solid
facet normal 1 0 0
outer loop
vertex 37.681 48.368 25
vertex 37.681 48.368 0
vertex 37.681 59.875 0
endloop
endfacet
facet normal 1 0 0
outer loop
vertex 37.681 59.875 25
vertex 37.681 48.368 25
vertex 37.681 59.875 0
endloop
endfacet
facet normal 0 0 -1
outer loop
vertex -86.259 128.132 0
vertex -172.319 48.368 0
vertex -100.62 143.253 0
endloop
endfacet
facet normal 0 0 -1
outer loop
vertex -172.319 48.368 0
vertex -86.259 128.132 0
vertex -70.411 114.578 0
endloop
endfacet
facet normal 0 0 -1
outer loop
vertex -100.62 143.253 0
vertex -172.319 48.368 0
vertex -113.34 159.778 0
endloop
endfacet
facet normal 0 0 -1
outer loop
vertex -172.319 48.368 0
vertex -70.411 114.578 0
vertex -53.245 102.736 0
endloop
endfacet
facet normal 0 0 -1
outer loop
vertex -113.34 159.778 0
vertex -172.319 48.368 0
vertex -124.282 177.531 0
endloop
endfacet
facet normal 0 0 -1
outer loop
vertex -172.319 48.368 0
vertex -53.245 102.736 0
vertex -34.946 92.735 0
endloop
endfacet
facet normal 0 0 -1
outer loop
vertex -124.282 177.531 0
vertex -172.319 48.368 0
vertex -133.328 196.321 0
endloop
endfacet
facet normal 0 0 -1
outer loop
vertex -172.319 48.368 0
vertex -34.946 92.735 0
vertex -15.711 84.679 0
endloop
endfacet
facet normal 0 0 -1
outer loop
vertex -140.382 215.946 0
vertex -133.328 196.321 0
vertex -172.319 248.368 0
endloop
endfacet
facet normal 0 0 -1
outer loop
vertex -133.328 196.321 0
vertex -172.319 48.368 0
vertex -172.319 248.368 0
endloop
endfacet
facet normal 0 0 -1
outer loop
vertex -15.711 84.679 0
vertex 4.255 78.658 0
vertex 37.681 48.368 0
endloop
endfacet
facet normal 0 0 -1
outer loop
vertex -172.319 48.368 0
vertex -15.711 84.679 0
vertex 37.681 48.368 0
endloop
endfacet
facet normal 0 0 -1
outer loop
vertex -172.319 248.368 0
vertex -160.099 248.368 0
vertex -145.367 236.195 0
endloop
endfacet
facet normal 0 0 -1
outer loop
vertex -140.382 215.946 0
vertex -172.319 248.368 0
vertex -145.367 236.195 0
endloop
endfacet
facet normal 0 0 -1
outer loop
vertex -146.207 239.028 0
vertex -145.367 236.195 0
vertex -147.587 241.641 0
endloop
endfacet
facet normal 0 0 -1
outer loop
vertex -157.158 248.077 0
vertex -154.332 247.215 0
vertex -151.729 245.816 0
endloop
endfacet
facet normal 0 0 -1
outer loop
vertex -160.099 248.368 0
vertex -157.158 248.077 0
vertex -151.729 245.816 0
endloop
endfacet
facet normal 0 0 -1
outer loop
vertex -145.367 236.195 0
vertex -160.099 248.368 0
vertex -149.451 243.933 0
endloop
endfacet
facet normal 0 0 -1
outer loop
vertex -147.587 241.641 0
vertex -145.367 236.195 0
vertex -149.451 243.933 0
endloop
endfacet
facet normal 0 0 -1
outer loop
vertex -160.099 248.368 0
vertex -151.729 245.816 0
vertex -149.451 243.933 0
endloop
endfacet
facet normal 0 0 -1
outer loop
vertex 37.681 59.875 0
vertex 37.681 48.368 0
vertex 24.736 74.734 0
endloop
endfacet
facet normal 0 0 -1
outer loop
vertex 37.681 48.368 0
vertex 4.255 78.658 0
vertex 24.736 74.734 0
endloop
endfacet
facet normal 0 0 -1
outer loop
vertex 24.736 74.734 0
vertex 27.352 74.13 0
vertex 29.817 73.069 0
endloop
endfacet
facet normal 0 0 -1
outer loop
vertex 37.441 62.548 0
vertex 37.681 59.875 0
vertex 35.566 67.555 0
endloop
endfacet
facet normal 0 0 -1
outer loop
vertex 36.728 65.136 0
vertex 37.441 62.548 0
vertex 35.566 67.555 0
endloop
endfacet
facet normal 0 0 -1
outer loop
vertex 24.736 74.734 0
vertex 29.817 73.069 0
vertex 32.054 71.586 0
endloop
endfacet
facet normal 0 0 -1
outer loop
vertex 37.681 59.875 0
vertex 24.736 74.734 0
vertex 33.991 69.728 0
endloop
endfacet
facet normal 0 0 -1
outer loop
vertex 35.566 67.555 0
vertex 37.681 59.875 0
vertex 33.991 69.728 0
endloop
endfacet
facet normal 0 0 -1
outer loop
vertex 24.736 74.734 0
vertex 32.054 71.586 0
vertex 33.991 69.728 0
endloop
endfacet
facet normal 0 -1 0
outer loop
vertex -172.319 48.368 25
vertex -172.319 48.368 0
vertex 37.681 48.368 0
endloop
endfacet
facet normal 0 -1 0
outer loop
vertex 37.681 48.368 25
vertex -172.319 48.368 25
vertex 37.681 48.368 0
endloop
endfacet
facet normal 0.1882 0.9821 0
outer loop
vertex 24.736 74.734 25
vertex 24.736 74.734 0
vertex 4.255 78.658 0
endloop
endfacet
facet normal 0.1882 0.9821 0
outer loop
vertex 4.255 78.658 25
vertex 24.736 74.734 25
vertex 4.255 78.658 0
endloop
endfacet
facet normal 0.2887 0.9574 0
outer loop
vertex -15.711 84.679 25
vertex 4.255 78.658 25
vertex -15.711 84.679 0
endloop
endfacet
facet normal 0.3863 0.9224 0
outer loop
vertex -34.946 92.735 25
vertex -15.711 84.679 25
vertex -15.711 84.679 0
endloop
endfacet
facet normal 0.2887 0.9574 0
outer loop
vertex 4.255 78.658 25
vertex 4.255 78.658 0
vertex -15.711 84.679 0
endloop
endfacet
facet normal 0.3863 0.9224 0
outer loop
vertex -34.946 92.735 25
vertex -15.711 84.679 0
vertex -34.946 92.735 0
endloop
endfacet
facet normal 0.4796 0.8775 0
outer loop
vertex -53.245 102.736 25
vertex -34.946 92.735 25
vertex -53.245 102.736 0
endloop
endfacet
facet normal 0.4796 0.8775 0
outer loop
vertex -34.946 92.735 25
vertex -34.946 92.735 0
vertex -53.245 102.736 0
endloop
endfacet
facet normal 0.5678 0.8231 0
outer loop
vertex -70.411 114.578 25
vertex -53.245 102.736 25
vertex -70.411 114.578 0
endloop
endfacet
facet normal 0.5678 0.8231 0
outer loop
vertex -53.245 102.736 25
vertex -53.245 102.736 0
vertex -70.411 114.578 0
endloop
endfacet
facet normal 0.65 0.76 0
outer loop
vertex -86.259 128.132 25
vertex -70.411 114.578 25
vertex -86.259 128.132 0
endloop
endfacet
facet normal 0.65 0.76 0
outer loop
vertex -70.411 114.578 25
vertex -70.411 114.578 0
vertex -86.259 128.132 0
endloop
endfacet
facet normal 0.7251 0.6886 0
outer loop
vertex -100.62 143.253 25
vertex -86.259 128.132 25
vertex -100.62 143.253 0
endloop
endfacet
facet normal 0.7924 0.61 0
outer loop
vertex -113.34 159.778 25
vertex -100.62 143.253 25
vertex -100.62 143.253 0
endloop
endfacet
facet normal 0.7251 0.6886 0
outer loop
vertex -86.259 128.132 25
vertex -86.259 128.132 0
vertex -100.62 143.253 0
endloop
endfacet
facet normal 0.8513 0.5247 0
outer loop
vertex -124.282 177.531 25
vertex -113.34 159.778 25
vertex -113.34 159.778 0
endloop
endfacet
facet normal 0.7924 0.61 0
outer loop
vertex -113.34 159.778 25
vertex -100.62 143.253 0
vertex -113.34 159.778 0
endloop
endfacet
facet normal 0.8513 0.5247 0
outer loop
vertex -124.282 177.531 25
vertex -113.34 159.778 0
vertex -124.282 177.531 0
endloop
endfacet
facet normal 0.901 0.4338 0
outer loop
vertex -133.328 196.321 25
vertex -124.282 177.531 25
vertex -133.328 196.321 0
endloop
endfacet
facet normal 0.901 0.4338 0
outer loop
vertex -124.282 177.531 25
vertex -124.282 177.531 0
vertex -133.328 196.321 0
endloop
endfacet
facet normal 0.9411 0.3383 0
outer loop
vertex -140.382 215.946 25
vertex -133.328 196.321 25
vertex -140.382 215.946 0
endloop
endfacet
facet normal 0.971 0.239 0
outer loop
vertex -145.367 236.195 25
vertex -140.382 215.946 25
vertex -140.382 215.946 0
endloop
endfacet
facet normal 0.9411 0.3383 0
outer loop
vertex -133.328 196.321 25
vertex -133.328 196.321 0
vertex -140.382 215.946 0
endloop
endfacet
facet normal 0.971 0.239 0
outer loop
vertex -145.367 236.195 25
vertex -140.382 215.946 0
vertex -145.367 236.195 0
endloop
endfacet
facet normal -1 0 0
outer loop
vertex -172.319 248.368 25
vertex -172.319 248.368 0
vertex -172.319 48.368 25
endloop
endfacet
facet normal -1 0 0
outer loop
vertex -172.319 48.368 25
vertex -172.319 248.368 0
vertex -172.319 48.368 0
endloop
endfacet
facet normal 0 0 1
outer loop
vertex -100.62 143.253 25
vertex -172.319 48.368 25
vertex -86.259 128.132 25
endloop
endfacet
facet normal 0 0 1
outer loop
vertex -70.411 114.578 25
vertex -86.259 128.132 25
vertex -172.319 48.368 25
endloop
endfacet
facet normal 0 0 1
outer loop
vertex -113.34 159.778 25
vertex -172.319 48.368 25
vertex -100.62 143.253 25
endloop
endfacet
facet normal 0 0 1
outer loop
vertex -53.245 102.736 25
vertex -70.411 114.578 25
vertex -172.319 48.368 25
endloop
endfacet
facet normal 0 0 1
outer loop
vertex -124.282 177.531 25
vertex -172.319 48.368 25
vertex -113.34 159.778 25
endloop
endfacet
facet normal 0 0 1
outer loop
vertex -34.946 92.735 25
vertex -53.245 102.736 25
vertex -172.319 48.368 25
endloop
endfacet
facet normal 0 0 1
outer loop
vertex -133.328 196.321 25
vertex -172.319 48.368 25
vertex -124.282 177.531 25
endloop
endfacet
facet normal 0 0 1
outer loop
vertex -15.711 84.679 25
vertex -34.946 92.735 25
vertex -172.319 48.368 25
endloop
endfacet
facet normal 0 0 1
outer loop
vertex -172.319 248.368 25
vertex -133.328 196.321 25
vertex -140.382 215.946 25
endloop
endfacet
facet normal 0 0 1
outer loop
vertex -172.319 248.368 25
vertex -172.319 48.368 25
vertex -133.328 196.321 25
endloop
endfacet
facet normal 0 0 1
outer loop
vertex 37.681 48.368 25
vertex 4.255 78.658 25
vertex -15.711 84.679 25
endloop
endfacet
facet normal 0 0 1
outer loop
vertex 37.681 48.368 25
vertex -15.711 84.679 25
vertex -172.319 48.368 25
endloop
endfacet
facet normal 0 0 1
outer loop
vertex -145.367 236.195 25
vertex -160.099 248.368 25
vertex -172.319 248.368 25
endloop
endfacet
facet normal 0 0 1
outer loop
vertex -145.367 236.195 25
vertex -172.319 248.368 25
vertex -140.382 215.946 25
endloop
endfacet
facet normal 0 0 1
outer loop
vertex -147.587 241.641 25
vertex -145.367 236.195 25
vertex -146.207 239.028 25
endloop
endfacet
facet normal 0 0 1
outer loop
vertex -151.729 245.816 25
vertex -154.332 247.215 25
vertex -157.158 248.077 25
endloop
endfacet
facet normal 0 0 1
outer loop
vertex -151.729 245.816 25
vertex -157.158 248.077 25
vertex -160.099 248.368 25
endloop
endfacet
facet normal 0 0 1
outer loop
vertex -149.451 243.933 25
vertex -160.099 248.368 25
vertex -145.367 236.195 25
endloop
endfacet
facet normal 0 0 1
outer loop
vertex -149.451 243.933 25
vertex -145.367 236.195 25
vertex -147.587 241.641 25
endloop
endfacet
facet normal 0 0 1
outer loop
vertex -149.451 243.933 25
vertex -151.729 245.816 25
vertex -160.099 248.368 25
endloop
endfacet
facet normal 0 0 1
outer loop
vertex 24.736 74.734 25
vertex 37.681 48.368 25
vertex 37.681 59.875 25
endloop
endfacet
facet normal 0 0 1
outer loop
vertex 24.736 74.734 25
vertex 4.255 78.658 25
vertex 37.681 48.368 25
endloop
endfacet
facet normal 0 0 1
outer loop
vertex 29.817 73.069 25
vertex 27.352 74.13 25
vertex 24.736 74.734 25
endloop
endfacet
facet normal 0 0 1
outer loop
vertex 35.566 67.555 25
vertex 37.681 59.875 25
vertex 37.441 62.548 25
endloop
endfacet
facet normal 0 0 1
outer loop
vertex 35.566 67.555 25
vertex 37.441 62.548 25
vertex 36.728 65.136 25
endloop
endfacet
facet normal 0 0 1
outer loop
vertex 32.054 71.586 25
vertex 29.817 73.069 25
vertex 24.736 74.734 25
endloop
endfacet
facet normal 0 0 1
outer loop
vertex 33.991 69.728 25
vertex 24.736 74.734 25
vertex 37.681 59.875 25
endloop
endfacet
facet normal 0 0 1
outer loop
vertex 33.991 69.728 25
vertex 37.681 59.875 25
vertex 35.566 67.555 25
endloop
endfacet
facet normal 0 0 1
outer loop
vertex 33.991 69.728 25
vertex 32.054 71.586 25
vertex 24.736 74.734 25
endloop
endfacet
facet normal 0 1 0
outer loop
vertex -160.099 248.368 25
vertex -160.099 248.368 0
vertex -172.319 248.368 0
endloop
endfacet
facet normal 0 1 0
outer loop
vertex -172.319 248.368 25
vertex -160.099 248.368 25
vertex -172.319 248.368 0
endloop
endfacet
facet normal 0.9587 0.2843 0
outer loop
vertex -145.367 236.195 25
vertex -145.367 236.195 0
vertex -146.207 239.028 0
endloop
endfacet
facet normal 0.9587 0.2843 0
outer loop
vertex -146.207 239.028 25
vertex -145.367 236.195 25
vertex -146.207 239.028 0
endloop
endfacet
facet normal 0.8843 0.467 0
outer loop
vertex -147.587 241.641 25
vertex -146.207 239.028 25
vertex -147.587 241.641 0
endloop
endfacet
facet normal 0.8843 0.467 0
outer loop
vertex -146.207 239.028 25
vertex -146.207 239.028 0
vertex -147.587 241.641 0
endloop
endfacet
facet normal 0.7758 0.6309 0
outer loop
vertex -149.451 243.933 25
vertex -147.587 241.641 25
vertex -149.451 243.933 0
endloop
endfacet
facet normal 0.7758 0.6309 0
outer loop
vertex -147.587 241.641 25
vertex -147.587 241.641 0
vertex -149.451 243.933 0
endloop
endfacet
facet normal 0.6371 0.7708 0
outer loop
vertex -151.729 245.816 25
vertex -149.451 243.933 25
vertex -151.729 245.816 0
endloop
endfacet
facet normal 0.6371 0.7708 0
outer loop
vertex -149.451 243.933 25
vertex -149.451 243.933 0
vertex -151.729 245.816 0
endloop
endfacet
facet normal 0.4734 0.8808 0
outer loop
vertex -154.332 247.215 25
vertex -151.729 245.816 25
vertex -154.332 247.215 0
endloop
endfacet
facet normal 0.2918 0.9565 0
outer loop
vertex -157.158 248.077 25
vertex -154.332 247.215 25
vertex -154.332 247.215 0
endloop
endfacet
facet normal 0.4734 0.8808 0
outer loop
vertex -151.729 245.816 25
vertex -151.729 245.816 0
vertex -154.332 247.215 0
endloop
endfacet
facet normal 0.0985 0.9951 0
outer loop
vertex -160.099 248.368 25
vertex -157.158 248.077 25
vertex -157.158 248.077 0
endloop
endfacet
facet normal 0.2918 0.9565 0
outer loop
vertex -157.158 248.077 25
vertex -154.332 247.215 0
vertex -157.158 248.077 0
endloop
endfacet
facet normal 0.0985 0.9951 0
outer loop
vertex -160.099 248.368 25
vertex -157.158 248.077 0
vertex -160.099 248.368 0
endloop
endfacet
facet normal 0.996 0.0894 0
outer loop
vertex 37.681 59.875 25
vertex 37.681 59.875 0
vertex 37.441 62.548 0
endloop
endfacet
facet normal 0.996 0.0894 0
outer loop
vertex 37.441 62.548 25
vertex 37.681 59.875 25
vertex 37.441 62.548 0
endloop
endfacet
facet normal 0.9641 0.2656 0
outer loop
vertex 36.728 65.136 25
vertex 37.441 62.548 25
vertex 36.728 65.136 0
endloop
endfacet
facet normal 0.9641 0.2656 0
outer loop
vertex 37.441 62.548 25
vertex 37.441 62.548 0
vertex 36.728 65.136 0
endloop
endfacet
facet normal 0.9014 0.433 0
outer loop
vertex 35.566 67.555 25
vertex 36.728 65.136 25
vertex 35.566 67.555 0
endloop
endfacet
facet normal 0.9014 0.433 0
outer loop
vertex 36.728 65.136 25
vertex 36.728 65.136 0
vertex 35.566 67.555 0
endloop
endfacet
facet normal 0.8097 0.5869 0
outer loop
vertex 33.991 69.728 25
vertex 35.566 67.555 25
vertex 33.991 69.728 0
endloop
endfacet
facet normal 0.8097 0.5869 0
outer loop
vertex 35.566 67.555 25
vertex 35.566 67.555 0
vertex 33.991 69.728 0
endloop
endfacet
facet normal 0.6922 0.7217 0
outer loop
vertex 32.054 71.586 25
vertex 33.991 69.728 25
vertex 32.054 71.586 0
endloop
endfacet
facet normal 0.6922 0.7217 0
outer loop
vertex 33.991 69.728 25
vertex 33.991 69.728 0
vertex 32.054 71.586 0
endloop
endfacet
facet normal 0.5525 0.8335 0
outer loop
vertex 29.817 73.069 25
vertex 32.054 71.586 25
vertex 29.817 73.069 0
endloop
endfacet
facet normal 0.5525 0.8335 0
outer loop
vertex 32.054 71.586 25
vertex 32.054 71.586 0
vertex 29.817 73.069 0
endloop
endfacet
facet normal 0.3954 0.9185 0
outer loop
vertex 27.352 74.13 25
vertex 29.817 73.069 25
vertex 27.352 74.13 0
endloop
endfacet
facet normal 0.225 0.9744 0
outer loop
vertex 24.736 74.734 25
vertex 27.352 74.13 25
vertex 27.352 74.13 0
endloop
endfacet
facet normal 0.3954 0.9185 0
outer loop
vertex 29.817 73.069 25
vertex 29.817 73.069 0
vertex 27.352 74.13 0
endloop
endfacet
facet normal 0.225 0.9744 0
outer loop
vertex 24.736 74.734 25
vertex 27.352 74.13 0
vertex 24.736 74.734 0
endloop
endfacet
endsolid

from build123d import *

# Parameters (mm, degrees)
F1_DEPTH = 25


with BuildPart() as f1:
    # F0 (on Top) → F1 (new body)
    with BuildSketch(Plane.XY):
        with BuildLine():
            Line((-160.09872, 248.367966), (-172.318979, 248.367966))
            Line((-172.318979, 248.367966), (-172.318979, 48.367966))
            Line((-172.318979, 48.367966), (37.681021, 48.367966))
            Line((37.681021, 48.367966), (37.681021, 59.875305))
            ThreePointArc((37.681021, 59.875305), (33.991015, 69.728429), (24.736483, 74.733807))
            ThreePointArc((24.736483, 74.733807), (-86.259099, 128.13192), (-145.367485, 236.194754))
            ThreePointArc((-145.367485, 236.194754), (-150.543664, 244.930877), (-160.09872, 248.367966))
        make_face()
    extrude(amount=F1_DEPTH)


solid = f1.part
